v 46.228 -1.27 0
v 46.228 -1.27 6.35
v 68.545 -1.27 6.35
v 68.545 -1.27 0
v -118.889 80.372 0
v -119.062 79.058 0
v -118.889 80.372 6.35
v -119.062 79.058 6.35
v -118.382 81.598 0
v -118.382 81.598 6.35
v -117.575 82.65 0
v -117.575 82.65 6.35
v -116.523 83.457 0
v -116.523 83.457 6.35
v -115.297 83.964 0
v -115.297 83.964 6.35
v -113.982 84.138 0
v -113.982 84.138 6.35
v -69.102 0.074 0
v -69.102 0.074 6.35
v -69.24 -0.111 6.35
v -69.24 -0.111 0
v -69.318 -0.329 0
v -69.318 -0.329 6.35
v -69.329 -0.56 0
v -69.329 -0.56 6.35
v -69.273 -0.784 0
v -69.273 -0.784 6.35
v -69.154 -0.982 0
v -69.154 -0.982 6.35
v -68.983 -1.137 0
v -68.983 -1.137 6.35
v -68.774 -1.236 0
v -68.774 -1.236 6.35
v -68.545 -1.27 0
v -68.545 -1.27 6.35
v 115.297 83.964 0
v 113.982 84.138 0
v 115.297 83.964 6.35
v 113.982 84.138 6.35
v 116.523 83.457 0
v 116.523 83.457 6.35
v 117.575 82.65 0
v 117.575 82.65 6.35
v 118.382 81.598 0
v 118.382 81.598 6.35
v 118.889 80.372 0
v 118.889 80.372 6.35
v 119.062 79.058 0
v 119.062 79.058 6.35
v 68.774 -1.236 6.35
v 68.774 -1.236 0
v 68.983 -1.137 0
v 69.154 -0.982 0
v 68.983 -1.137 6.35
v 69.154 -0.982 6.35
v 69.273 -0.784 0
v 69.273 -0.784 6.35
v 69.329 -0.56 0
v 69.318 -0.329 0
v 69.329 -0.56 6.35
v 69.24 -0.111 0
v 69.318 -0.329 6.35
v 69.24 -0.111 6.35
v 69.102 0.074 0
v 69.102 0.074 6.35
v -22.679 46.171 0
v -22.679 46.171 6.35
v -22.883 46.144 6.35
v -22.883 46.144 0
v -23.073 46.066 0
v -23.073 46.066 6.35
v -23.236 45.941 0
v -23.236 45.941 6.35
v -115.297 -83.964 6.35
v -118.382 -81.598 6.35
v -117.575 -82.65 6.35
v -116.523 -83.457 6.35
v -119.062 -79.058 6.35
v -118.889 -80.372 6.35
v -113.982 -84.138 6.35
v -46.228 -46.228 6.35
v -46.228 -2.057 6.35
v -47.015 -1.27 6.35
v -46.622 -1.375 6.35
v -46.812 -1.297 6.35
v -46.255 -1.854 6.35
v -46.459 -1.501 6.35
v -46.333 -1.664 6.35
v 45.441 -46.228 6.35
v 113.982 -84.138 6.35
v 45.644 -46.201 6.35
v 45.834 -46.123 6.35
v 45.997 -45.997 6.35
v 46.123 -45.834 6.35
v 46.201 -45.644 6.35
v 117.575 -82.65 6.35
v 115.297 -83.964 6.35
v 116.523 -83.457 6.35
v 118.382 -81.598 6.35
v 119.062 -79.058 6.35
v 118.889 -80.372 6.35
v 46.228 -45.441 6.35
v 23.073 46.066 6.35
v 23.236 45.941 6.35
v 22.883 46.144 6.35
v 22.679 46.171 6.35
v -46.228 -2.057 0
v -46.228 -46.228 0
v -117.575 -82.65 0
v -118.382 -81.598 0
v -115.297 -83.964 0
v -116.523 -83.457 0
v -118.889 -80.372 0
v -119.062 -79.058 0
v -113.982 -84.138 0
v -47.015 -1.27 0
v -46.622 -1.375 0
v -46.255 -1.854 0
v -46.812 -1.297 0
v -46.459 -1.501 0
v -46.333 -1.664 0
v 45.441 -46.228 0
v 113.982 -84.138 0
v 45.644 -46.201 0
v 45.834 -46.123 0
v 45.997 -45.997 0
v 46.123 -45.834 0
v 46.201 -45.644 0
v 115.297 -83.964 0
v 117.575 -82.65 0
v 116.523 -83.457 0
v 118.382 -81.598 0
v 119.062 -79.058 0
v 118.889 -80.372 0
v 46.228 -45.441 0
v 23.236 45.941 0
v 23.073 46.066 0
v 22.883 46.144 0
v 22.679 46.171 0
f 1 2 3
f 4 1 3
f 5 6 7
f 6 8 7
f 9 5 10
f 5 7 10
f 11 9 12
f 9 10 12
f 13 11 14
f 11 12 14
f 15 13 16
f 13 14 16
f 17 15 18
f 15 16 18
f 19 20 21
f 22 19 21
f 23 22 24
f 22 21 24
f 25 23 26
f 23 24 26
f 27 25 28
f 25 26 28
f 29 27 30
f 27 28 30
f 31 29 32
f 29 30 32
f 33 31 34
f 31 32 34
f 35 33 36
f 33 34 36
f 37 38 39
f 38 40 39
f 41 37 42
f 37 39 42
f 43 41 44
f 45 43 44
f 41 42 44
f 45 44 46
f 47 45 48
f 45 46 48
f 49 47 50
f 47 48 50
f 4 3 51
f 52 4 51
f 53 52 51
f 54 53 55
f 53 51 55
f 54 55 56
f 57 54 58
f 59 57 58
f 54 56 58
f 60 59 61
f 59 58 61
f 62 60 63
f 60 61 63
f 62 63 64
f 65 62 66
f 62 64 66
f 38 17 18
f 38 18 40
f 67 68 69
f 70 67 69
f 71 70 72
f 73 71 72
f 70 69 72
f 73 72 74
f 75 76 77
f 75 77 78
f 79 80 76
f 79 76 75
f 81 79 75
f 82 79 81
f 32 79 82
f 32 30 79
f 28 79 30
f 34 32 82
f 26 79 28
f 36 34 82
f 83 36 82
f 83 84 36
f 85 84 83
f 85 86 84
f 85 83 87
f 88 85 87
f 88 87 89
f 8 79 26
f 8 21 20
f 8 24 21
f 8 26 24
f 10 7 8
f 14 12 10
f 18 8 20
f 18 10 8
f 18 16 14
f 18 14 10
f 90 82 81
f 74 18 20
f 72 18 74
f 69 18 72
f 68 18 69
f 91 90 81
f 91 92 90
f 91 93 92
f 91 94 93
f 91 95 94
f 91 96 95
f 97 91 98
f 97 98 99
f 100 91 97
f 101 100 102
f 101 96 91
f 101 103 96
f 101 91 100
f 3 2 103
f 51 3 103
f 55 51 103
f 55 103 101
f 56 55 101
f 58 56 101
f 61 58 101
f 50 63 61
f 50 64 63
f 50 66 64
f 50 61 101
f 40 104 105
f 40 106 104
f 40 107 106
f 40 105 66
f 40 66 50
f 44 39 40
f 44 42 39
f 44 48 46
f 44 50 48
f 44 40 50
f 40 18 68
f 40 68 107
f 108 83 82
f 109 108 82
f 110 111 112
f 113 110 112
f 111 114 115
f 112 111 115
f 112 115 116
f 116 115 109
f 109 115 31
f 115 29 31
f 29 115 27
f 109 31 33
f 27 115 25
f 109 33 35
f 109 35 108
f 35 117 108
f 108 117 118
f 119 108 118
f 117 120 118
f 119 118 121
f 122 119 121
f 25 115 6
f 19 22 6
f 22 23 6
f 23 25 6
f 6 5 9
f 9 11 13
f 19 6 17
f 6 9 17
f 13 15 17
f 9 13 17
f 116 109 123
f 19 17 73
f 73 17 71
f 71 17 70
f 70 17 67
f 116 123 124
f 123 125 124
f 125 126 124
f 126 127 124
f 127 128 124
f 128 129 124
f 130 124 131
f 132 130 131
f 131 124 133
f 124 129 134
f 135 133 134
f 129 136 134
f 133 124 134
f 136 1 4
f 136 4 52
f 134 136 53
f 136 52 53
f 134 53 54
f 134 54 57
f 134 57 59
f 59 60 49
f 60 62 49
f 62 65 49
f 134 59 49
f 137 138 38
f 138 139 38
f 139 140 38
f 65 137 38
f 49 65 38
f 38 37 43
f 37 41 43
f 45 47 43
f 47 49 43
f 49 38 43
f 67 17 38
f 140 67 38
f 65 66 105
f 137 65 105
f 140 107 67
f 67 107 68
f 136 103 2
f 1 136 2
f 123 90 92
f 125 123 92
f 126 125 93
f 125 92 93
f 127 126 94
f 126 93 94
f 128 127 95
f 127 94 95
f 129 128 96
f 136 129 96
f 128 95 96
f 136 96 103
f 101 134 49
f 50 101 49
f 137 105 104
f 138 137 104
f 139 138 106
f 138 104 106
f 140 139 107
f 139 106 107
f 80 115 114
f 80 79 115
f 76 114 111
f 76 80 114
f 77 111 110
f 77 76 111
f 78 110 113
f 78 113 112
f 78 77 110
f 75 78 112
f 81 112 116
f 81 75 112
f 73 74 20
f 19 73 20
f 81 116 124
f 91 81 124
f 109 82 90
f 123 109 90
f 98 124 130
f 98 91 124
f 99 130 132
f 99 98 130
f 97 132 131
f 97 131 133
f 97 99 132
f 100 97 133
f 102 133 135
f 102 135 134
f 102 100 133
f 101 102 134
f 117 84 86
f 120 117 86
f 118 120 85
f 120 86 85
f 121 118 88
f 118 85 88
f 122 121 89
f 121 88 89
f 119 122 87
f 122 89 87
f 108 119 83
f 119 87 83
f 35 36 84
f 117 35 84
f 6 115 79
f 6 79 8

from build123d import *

# Parameters (mm, degrees)
F0_W     = 238.125
F0_H     = 168.275
F1_DEPTH = 6.35
F3_DEPTH = 6.351
F5_DEPTH = 6.351
F6_R     = 5.08


with BuildPart() as f1:
    # F0 (on Top) → F1 (new body)
    with BuildSketch(Plane.XY):
        Rectangle(F0_W, F0_H)
    extrude(amount=F1_DEPTH)

    # F2 (on face) → F3 (cut, through all)
    with BuildSketch(Plane.XY.offset(6.35)):
        Polygon((22.479, 44.901281), (0, 44.901281), (-22.479, 44.901281), (-67.380281, 0), (-44.958, 0), (-44.958, -44.958), (0, -44.958), (44.958, -44.958), (44.958, 0), (67.380281, 0), align=None)
    extrude(amount=-F3_DEPTH, mode=Mode.SUBTRACT)

    # F4 (on face) → F5 (cut, through all)
    with BuildSketch(Plane.XY.offset(6.35)):
        with BuildLine():
            ThreePointArc((-22.678899, 46.171281), (-22.980224, 46.111343), (-23.235675, 45.940656))
            Line((-23.235675, 45.940656), (-69.102156, 0.074176))
            ThreePointArc((-69.102156, 0.074176), (-69.272843, -0.783925), (-68.54538, -1.27))
            Line((-68.54538, -1.27), (-47.0154, -1.27))
            ThreePointArc((-47.0154, -1.27), (-46.458624, -1.500624), (-46.228, -2.0574))
            Line((-46.228, -2.0574), (-46.228, -46.228))
            Line((-46.228, -46.228), (45.4406, -46.228))
            ThreePointArc((45.4406, -46.228), (45.997376, -45.997376), (46.228, -45.4406))
            Line((46.228, -45.4406), (46.228, -1.27))
            Line((46.228, -1.27), (68.54538, -1.27))
            ThreePointArc((68.54538, -1.27), (69.272843, -0.783925), (69.102156, 0.074176))
            Line((69.102156, 0.074176), (23.235675, 45.940656))
            ThreePointArc((23.235675, 45.940656), (22.980224, 46.111343), (22.678899, 46.171281))
            Line((22.678899, 46.171281), (-22.678899, 46.171281))
        make_face()
    extrude(amount=-F5_DEPTH, mode=Mode.SUBTRACT)

    # F6
    f6_edges = [f1.edges().sort_by_distance(p)[0] for p in [
        (119.0625, 84.1375, 3.175),
        (119.0625, -84.1375, 3.175),
        (-119.0625, -84.1375, 3.175),
        (-119.0625, 84.1375, 3.175),
    ]]
    fillet(f6_edges, radius=F6_R)


solid = f1.part
